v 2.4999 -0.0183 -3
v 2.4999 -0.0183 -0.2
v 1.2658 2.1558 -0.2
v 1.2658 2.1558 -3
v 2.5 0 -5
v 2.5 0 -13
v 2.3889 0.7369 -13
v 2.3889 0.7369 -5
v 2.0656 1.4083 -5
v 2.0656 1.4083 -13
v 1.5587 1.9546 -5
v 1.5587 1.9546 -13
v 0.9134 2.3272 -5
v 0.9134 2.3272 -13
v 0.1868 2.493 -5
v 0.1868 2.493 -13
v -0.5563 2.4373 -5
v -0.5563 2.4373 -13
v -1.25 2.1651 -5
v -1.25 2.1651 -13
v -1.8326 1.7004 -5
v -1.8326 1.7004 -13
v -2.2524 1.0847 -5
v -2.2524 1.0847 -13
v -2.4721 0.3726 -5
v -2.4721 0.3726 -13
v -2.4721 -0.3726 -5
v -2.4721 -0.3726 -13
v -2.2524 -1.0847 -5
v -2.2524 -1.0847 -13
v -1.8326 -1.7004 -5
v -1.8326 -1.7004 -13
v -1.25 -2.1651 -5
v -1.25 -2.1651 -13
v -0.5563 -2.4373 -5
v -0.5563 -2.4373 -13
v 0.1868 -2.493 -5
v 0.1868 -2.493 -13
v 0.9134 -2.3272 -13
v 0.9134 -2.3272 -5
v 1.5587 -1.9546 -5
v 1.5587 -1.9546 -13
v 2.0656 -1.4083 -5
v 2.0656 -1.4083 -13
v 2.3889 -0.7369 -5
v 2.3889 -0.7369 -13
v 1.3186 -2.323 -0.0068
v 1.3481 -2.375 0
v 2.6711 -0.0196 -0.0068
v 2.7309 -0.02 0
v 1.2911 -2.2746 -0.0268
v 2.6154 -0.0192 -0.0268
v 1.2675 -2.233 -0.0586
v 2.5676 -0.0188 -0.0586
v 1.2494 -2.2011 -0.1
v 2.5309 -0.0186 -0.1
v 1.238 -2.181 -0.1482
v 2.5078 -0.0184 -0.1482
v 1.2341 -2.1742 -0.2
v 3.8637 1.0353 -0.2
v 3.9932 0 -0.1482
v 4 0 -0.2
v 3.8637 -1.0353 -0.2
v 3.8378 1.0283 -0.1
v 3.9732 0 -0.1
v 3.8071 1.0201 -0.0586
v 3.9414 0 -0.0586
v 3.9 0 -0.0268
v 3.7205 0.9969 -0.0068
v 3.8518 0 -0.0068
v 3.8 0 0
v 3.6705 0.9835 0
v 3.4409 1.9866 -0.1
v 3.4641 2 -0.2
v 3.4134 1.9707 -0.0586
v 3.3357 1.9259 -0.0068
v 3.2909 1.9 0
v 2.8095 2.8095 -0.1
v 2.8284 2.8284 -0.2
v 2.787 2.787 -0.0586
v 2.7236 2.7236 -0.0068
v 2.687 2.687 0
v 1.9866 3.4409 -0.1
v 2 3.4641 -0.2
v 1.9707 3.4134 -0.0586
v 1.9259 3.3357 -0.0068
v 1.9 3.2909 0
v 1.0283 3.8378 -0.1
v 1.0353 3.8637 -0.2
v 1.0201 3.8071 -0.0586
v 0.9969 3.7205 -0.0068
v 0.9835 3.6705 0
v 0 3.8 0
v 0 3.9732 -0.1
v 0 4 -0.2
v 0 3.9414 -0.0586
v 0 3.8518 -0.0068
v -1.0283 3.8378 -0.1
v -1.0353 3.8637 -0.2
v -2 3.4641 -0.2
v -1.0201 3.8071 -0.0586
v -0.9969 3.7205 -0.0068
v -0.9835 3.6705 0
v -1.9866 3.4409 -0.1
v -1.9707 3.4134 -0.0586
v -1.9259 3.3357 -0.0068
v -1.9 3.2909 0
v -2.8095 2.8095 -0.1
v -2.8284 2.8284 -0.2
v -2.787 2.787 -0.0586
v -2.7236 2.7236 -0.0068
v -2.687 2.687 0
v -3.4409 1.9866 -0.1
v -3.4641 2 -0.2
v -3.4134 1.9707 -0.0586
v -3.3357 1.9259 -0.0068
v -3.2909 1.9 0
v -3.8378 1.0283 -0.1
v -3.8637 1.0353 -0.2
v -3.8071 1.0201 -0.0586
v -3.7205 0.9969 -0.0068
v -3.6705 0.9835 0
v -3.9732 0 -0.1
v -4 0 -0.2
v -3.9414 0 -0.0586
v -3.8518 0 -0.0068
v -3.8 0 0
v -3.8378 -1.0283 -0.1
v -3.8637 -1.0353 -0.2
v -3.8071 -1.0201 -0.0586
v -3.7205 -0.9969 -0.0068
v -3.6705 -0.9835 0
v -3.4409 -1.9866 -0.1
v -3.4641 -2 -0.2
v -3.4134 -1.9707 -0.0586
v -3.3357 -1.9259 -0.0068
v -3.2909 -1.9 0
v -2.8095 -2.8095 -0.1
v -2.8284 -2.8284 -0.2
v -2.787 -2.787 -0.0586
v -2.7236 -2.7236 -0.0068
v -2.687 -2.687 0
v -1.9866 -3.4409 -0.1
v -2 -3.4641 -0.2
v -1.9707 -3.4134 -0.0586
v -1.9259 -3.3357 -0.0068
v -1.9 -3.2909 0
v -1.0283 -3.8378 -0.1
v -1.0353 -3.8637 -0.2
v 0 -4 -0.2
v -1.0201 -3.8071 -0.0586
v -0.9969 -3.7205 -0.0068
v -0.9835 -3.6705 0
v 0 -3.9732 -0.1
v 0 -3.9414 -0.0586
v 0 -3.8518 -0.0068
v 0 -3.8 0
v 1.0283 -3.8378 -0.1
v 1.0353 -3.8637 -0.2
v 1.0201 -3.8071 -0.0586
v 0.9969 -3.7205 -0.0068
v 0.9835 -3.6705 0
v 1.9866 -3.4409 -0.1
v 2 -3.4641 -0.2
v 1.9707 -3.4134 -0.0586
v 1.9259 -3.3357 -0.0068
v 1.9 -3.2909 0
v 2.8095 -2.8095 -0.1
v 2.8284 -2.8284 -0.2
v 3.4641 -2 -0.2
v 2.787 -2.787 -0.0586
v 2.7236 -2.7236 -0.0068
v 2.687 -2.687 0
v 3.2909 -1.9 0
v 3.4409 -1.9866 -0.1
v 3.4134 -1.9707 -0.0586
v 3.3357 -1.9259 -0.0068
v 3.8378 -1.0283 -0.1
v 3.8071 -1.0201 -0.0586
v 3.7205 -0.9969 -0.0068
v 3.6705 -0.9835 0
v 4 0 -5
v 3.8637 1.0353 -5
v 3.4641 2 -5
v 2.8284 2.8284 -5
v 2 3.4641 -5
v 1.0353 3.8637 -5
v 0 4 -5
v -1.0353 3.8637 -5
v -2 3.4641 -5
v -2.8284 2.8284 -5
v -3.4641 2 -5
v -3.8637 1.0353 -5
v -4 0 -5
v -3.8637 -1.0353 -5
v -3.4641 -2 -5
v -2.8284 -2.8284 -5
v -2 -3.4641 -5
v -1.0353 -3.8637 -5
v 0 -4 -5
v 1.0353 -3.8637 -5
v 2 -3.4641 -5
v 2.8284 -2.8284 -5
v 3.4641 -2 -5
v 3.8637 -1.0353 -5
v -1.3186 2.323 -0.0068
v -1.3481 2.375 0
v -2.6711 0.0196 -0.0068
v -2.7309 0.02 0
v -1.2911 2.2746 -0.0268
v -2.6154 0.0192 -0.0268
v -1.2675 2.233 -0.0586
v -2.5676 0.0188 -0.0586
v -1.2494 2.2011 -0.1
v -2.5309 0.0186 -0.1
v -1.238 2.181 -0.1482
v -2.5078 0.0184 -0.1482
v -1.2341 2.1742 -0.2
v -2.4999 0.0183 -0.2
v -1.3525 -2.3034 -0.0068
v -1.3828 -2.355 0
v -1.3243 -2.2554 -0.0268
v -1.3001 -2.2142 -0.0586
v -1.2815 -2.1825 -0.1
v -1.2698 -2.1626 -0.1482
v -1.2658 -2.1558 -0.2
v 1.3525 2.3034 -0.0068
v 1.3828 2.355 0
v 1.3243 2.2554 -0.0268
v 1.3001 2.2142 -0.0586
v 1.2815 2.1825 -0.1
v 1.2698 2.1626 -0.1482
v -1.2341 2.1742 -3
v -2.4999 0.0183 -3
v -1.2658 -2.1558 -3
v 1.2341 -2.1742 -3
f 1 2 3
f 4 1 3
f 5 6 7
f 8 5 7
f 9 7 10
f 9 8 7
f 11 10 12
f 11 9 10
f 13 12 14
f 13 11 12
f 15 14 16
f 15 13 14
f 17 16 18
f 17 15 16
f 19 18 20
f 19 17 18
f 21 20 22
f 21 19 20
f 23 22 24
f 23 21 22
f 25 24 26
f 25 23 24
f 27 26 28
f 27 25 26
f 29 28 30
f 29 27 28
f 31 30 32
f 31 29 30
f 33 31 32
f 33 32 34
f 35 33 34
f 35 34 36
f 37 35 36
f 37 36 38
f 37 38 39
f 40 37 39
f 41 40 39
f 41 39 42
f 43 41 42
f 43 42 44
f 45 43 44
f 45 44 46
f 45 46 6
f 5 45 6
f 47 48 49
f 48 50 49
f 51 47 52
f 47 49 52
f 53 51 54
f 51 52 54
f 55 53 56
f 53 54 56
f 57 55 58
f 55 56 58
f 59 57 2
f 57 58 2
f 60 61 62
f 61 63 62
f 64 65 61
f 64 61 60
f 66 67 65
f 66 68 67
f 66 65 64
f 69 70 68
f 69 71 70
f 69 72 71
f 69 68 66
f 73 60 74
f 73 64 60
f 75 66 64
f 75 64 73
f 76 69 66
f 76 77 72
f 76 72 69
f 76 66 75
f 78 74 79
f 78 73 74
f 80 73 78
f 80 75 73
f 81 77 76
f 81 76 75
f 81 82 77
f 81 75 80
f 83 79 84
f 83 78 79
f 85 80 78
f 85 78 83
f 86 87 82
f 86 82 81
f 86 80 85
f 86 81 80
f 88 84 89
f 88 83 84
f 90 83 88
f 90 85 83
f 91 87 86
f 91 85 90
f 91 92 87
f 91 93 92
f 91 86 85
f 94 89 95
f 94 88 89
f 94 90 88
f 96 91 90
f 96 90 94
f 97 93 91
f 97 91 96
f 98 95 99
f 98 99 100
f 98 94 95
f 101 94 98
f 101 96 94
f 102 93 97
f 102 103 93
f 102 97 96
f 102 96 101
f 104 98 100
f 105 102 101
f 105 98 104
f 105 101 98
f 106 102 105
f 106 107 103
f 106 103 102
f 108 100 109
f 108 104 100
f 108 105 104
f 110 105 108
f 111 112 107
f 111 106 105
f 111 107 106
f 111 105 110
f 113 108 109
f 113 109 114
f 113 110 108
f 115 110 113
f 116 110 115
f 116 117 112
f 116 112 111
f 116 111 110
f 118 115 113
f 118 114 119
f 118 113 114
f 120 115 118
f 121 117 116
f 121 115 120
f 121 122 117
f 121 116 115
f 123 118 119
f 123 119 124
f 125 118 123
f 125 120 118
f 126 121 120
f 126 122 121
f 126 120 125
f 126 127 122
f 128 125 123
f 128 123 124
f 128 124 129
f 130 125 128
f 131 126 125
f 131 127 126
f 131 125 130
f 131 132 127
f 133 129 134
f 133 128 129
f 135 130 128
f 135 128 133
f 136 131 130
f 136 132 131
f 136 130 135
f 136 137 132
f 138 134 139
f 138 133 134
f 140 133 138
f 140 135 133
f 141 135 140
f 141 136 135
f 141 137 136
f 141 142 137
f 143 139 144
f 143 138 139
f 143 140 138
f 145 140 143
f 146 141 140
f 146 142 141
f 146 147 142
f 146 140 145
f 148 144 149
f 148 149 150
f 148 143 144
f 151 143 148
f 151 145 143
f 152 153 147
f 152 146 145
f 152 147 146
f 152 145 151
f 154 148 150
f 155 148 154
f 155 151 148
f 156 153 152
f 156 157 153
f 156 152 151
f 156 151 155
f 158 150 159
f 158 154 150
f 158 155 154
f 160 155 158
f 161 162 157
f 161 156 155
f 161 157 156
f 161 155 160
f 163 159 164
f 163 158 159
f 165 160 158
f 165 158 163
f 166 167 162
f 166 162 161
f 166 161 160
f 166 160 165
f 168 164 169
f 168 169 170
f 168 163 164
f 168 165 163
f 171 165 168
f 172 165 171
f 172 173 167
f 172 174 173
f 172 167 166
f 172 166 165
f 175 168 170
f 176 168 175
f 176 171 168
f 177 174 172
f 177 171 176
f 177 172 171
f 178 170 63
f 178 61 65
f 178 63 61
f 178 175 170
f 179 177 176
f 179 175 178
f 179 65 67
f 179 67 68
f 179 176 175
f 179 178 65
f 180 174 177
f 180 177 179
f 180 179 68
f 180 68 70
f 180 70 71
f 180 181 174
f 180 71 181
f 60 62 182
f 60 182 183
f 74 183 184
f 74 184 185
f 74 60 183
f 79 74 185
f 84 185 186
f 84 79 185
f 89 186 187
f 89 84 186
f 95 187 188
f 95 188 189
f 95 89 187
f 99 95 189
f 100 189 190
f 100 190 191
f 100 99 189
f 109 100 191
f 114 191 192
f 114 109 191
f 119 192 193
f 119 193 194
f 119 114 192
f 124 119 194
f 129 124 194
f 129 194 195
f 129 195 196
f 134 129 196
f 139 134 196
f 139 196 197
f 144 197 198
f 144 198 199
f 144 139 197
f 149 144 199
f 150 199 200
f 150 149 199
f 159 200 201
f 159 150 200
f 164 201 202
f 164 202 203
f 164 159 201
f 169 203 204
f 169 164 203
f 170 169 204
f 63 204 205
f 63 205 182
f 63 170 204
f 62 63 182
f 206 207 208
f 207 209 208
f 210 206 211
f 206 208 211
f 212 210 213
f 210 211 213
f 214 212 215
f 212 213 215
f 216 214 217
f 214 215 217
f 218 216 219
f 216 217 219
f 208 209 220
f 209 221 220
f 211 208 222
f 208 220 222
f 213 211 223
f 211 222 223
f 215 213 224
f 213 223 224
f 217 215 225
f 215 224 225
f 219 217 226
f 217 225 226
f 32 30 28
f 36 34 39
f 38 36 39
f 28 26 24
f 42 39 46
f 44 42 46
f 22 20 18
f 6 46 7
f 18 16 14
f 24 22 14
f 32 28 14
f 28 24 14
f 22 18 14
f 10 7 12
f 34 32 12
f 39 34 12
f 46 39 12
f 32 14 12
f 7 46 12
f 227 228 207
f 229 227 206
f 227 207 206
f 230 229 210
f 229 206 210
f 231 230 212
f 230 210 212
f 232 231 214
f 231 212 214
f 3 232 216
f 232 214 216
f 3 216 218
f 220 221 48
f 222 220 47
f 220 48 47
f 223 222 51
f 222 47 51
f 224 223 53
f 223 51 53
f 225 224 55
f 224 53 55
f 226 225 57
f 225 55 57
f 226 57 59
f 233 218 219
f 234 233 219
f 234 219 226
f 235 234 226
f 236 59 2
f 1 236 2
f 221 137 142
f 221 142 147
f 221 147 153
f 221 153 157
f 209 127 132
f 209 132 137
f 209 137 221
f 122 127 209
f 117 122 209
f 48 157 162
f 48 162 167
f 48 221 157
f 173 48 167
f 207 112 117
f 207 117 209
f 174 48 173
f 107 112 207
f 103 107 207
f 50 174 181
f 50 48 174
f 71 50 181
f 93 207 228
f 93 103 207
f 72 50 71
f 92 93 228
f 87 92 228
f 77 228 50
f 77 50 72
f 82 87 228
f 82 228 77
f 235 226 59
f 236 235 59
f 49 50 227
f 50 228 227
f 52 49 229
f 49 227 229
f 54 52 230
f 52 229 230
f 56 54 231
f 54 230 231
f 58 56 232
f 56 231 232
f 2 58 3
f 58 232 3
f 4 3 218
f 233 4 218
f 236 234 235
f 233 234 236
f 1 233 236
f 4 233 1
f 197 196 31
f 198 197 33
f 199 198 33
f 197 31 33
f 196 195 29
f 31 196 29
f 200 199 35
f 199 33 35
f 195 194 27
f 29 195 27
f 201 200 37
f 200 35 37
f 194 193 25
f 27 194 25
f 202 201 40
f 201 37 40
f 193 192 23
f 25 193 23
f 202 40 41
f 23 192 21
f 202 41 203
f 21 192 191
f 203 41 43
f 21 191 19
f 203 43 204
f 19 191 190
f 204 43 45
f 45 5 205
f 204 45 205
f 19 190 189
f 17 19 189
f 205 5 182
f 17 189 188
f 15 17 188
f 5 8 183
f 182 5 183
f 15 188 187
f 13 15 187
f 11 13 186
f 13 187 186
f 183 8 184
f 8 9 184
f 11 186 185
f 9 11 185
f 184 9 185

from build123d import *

# Parameters (mm, degrees)
F1_R     = 2.5
F2_DEPTH = 13
F0_R     = 4
F3_DEPTH = 5
F5_DEPTH = 3
F6_R     = 0.2


with BuildPart() as f2:
    # F1 (on face) → F2 (new body)
    with BuildSketch(Plane.XY):
        Circle(F1_R)
    extrude(amount=-F2_DEPTH)

    # F0 (on Top) → F3 (join)
    with BuildSketch(Plane.XY):
        Circle(F0_R)
    extrude(amount=-F3_DEPTH)

    # F4 (on Top) → F5 (cut)
    with BuildSketch(Plane.XY):
        Polygon((2.4999327503, -0.0183369572), (1.265846646, 2.1558367909), (-1.2340861043, 2.1741737481), (-2.4999327503, 0.0183369572), (-1.265846646, -2.1558367909), (1.2340861043, -2.1741737481), align=None)
    extrude(amount=-F5_DEPTH, mode=Mode.SUBTRACT)

    # F6
    f6_edges = [f2.edges().sort_by_distance(p)[0] for p in [
        (1.867009, -1.096255, 0),
        (-4, 0, 0),
        (1.88289, 1.06875, 0),
        (0.01588, 2.165005, 0),
        (-1.867009, 1.096255, 0),
        (-1.88289, -1.06875, 0),
        (-0.01588, -2.165005, 0),
    ]]
    fillet(f6_edges, radius=F6_R)


solid = f2.part
